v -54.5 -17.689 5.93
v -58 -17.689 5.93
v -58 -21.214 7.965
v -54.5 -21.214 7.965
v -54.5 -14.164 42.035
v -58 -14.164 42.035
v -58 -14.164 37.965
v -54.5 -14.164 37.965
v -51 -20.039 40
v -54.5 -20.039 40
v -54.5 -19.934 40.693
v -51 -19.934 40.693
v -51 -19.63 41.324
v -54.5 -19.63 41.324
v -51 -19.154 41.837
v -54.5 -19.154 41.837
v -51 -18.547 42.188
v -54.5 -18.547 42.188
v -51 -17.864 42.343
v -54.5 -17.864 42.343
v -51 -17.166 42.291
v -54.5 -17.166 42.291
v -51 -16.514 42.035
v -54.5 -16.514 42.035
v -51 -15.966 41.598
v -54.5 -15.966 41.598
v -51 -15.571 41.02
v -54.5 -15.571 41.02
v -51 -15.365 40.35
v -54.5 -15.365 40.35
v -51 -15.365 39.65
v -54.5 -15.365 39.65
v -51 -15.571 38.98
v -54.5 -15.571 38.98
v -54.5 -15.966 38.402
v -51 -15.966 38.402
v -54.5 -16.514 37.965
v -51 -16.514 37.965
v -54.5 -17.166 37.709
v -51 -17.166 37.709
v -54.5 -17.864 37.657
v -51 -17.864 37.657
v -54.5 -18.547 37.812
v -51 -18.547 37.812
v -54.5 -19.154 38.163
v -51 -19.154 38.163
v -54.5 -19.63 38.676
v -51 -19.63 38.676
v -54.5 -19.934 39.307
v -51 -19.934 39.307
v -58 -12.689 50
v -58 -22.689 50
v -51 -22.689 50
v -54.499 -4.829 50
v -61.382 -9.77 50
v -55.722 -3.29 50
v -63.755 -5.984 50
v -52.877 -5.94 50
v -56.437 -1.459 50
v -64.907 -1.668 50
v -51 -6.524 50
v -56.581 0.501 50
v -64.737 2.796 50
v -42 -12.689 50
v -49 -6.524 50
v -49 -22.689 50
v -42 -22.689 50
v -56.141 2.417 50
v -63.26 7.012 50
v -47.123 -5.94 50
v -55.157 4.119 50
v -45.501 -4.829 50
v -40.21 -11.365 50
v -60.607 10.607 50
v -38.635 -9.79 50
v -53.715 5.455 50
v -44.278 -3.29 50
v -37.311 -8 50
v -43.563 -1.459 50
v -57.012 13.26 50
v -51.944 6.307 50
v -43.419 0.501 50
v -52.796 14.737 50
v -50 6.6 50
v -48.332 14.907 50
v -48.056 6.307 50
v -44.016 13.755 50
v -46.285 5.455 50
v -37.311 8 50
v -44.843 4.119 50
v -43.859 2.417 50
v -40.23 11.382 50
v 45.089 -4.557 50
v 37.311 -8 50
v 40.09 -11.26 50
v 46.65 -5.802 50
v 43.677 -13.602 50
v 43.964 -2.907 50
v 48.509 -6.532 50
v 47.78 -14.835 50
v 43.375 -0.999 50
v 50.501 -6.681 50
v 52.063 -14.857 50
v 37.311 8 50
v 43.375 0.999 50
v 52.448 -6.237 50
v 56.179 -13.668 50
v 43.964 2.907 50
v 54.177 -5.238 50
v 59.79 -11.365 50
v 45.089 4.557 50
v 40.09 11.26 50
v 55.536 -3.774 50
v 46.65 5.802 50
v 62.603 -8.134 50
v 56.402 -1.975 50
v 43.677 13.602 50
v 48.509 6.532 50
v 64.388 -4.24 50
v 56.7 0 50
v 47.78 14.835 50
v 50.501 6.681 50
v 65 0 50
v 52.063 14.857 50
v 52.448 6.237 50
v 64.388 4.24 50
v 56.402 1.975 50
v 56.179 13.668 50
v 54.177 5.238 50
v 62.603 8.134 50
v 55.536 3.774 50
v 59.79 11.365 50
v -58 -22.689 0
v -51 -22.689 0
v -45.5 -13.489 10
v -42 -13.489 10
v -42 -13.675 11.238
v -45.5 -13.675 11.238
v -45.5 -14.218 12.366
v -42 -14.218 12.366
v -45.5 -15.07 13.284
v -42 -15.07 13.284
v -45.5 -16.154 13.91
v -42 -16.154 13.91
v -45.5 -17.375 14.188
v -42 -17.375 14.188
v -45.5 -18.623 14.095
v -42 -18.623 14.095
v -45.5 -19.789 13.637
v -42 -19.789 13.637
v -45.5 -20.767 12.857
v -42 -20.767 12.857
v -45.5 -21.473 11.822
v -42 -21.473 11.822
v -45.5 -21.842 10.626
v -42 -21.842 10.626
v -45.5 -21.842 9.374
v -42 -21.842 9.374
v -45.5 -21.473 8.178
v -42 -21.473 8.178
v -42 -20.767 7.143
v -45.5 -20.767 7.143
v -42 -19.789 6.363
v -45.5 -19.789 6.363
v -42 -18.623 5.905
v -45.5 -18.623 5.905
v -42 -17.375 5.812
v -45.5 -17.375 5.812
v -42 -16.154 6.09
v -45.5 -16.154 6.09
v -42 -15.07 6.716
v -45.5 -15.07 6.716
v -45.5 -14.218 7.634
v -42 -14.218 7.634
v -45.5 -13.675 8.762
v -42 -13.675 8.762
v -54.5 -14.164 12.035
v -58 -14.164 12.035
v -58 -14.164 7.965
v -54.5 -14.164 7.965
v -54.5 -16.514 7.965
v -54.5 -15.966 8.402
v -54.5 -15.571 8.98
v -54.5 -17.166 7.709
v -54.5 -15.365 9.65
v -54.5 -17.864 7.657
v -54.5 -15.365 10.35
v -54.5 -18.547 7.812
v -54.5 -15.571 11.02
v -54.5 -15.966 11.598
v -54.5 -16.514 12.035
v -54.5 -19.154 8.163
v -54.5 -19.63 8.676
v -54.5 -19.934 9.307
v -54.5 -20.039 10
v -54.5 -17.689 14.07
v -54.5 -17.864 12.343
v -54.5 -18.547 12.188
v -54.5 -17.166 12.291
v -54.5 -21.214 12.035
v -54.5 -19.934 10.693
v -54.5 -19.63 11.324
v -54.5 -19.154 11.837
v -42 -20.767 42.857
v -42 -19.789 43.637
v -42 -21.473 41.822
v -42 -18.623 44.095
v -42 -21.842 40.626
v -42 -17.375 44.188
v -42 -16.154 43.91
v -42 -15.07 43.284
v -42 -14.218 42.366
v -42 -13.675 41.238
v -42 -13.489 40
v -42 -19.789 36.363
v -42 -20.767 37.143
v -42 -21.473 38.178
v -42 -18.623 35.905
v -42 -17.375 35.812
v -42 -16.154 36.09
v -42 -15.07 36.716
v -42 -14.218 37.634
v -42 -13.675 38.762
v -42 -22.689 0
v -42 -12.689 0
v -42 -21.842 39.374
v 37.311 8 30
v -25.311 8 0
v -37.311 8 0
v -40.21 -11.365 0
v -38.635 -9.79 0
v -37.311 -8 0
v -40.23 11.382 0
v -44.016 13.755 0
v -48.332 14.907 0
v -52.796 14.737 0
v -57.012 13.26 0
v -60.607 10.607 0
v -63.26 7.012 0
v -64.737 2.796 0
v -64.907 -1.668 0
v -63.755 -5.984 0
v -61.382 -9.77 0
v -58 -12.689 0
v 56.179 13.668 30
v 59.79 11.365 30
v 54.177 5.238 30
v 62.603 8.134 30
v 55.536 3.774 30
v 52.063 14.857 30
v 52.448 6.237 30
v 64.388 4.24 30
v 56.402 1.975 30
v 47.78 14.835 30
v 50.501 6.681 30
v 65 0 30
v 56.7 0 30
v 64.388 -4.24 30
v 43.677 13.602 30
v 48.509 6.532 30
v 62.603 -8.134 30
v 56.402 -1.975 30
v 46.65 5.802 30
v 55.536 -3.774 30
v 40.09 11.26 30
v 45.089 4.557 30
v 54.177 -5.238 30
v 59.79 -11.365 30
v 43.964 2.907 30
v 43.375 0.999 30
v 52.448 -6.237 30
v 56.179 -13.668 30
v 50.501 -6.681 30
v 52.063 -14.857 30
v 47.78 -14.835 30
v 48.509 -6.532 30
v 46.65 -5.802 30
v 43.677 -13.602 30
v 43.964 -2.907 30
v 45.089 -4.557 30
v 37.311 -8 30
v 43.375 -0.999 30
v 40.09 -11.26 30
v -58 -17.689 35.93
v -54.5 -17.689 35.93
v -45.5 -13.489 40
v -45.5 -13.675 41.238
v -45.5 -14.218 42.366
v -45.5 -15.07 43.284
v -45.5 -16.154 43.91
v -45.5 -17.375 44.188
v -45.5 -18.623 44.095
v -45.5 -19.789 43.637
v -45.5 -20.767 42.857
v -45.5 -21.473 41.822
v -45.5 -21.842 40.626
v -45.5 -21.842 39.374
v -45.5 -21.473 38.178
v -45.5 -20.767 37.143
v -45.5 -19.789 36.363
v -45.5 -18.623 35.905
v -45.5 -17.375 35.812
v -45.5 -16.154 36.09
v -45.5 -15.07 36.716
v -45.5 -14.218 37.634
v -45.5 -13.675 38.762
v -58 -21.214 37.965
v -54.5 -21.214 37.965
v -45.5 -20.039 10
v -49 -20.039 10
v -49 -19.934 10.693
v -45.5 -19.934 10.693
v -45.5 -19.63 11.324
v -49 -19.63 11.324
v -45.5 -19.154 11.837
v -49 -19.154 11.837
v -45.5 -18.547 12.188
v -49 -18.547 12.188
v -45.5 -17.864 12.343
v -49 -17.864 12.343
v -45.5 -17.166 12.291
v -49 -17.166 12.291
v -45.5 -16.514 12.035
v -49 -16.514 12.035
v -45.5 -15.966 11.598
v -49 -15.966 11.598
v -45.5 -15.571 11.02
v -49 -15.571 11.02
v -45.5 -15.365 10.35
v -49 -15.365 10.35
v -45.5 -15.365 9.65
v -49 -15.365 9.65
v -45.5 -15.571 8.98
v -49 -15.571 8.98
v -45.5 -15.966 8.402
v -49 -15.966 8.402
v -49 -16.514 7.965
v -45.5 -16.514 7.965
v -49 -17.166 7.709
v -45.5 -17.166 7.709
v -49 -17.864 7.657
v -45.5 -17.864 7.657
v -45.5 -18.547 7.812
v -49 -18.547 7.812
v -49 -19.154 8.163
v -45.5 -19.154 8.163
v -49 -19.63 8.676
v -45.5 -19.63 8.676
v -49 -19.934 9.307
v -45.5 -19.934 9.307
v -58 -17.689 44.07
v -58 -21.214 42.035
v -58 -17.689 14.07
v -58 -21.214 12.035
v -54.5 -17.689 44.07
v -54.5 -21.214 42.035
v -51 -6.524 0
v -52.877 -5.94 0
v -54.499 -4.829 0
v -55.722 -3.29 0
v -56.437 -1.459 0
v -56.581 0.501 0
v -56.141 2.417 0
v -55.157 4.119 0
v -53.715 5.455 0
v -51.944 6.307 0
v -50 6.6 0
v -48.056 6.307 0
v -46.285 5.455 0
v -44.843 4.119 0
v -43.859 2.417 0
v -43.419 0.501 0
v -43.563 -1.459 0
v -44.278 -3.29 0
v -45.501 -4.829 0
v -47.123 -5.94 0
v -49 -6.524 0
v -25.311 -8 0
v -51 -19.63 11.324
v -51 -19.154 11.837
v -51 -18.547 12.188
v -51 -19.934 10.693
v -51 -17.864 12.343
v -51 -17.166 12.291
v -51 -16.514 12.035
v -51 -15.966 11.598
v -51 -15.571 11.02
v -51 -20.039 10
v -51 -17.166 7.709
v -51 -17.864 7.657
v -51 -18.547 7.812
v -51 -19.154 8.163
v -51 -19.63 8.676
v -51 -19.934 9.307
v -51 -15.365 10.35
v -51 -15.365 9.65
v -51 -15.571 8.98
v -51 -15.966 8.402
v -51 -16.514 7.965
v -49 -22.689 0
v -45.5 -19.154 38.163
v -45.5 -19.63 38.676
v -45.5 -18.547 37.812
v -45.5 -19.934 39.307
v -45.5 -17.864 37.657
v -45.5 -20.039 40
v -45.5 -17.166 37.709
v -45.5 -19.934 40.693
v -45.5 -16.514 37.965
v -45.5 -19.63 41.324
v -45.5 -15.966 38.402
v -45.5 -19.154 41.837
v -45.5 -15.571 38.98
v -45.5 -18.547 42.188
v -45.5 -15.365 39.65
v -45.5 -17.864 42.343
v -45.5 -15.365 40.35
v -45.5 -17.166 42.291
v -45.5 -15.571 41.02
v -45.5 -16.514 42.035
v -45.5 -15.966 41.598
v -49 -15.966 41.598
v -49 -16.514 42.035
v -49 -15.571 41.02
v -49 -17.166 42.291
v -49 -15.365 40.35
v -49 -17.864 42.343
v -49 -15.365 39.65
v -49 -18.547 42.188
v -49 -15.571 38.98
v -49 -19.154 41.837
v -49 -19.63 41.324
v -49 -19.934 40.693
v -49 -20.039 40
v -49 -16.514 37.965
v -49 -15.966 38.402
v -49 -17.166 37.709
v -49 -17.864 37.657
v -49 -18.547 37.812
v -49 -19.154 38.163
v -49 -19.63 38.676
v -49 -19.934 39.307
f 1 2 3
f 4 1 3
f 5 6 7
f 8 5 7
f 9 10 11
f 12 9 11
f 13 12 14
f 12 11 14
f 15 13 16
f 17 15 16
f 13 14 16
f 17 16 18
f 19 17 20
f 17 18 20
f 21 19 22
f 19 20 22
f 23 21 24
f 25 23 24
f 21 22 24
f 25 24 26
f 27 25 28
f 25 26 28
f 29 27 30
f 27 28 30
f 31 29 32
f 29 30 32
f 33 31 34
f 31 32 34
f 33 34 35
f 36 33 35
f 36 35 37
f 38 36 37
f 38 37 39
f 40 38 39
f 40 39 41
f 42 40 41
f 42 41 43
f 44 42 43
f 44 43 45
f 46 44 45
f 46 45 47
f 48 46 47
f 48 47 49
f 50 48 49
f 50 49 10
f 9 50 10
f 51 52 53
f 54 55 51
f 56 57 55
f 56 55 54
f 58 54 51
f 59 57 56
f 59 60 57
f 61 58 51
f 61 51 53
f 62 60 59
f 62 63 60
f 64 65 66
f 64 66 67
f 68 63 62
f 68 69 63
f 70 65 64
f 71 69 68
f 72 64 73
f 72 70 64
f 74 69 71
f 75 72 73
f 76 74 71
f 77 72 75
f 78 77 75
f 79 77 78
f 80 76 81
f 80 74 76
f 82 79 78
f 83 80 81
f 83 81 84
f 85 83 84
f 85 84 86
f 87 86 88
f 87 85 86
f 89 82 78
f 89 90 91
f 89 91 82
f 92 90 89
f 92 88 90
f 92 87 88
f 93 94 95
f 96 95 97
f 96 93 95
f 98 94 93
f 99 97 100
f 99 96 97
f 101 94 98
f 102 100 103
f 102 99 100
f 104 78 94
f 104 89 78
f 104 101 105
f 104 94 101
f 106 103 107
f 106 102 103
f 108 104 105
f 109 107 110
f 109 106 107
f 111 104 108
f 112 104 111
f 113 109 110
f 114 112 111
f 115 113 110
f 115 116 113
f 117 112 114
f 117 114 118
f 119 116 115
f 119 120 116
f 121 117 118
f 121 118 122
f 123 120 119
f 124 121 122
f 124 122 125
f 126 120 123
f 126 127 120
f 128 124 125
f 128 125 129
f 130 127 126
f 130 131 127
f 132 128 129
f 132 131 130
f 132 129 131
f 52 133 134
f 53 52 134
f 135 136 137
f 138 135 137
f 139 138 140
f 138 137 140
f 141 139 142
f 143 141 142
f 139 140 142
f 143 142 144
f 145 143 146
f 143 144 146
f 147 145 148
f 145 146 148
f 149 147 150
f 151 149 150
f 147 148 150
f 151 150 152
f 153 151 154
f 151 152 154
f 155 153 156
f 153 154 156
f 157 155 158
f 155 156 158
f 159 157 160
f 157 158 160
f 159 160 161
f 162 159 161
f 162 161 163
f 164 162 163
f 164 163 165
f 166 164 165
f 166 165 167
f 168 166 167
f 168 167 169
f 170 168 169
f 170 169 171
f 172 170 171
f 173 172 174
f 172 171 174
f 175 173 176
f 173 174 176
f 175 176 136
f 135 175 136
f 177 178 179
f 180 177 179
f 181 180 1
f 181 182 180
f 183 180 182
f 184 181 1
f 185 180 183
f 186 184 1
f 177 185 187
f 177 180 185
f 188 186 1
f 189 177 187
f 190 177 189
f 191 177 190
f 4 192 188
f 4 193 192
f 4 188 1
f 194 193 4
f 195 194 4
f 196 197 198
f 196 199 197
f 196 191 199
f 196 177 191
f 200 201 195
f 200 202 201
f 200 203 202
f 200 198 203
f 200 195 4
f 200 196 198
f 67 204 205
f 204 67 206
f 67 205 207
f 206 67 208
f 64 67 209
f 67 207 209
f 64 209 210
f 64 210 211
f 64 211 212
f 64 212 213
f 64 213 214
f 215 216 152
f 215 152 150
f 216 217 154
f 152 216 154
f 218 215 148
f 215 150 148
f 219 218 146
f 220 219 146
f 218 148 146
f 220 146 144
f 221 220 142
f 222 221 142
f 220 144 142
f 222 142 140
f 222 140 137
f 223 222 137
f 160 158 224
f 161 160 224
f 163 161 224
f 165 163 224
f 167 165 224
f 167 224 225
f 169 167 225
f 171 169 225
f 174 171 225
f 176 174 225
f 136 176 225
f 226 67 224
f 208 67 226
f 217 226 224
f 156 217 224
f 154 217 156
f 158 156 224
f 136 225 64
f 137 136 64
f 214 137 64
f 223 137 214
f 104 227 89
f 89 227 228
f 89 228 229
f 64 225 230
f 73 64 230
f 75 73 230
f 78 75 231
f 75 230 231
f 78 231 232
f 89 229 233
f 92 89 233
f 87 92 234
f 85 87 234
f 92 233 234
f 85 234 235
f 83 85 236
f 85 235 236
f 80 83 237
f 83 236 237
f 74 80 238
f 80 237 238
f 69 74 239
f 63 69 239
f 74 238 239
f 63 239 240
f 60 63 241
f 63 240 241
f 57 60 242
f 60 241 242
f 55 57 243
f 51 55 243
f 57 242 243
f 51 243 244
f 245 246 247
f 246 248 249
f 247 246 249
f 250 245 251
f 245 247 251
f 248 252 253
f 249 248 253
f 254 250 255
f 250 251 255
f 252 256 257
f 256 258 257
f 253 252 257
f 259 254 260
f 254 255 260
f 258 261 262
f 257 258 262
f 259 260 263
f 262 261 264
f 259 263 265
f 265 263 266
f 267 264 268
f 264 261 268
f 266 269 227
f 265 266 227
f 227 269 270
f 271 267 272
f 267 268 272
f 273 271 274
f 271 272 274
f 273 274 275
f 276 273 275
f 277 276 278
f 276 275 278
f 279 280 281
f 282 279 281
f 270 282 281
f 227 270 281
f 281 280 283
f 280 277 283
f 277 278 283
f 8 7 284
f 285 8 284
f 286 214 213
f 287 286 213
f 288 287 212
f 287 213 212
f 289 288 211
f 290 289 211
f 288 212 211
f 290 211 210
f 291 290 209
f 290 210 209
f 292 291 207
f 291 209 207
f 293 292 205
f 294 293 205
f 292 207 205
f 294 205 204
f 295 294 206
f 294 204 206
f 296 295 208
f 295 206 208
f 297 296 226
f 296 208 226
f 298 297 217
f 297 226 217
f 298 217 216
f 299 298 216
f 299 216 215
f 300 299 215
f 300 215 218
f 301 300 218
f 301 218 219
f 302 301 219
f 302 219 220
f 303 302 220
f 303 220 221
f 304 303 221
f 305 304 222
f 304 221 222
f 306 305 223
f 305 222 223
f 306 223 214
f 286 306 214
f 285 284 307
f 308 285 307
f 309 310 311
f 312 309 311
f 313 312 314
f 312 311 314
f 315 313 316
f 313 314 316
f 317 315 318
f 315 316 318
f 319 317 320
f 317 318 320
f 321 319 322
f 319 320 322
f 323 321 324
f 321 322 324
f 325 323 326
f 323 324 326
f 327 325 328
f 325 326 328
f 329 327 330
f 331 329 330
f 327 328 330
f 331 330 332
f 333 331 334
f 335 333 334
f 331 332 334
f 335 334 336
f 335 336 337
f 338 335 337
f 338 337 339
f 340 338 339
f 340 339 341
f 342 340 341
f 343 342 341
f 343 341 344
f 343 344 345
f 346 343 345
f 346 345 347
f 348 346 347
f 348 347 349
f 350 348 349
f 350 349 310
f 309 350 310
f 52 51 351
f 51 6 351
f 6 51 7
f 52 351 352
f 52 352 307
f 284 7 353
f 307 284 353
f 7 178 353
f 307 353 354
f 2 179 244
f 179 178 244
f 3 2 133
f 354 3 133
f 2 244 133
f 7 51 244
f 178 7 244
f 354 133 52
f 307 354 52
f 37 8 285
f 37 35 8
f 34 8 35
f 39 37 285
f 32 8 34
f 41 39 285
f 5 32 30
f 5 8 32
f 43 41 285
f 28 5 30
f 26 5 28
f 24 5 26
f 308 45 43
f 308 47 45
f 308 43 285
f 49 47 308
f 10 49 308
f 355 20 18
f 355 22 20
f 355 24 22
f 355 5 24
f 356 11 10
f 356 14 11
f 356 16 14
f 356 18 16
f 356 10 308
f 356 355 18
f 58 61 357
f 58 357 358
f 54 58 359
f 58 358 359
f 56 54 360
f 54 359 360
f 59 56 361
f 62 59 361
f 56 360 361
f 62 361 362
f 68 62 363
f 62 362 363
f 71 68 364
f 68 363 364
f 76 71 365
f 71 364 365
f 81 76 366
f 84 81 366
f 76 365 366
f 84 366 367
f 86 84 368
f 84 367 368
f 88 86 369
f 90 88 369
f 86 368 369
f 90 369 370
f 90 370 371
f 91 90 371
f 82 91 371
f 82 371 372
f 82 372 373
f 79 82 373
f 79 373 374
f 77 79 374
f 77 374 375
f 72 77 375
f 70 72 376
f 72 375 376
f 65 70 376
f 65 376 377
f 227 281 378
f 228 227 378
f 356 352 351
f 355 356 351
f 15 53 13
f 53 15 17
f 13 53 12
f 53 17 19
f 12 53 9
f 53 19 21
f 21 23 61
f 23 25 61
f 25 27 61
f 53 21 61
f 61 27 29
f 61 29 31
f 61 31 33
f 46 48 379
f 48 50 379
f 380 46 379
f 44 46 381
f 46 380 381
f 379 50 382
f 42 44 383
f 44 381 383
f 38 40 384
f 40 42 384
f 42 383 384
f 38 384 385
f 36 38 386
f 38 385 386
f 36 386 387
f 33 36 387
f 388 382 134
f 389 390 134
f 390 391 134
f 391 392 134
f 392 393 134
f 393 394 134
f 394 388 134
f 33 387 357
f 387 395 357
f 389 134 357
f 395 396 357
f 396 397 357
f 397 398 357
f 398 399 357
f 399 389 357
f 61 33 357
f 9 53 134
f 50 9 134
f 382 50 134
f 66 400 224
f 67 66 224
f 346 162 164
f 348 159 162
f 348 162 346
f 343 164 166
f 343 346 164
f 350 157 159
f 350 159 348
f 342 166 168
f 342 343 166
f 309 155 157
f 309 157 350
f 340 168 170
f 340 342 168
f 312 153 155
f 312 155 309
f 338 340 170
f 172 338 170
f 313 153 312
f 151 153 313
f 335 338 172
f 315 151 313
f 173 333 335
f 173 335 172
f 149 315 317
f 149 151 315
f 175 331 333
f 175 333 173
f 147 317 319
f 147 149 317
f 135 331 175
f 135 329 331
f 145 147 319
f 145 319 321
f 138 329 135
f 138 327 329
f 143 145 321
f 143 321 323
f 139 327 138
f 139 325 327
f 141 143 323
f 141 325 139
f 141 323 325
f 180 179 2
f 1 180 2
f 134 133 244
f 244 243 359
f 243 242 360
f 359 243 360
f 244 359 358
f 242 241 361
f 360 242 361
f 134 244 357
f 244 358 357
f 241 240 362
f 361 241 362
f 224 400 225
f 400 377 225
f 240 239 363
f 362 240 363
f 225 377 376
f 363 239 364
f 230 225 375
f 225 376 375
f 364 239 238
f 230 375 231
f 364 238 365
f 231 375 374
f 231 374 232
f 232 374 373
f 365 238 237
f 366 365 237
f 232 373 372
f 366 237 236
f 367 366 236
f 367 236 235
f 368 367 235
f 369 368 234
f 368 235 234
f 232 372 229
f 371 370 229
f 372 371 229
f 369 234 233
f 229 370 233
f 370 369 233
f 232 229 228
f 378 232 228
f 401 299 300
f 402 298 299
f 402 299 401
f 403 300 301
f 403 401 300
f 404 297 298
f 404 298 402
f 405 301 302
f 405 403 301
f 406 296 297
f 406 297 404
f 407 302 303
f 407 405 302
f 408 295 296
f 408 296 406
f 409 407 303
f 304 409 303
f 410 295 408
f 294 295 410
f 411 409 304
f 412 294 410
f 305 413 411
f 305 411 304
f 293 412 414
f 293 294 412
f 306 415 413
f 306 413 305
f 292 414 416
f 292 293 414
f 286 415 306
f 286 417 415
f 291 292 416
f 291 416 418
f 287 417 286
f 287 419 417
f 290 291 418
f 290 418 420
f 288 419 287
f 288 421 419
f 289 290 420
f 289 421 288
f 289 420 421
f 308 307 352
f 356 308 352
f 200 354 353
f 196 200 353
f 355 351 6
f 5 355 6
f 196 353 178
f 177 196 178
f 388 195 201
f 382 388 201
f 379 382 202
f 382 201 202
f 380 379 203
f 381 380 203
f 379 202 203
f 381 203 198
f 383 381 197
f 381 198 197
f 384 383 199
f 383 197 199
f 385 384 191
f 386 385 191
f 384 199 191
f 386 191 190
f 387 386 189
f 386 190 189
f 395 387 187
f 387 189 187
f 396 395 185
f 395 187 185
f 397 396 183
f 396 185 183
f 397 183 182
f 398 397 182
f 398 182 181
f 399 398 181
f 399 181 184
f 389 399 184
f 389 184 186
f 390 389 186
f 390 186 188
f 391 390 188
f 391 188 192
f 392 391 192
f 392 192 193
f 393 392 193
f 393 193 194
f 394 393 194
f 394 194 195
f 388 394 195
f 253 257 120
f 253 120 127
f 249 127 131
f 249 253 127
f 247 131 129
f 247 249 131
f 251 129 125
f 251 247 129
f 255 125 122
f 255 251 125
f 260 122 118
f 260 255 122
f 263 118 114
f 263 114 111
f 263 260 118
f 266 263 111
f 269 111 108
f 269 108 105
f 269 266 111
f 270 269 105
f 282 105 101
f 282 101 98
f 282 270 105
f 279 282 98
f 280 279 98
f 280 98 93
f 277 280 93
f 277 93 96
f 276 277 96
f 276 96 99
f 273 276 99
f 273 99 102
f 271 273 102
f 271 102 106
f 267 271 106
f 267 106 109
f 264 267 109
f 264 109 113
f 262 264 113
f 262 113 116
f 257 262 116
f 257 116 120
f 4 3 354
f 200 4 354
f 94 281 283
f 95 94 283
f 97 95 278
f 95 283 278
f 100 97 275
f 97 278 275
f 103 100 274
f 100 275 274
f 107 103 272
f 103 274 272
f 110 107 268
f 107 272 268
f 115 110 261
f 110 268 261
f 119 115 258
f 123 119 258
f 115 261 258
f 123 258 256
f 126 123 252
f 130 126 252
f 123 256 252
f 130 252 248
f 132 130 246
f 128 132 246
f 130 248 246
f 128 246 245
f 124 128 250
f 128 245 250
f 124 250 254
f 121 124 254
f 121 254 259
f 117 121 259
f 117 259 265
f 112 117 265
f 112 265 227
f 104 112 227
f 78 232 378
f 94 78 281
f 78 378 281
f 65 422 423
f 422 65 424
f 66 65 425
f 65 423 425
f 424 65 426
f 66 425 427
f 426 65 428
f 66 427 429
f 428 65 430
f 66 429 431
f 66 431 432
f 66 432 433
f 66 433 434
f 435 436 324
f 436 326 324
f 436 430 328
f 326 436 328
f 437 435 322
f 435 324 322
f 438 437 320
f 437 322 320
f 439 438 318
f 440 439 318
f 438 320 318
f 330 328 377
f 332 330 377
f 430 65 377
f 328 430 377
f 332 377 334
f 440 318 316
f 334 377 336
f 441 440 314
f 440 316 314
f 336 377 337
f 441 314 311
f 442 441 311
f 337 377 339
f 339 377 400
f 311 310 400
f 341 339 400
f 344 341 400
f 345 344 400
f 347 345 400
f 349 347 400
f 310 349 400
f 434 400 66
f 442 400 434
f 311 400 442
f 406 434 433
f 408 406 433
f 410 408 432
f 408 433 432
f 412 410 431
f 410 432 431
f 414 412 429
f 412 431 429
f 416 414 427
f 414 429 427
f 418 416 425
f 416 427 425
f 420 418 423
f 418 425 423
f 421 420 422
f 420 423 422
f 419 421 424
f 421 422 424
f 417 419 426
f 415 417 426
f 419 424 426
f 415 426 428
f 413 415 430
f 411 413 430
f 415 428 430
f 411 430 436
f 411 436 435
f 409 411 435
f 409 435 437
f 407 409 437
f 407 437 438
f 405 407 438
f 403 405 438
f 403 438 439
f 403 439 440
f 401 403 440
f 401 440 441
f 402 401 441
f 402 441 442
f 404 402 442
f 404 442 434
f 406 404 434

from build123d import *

# Parameters (mm, degrees)
F0_R      = 6.7
F1_DEPTH  = 50
F4_DEPTH  = 38.001
F5_R      = 2.35
F6_DEPTH  = 20
F8_DEPTH  = 3.5
F9_R      = 4.2
F10_DEPTH = 3.5


with BuildPart() as f1:
    # F0 (on Top) → F1 (new body)
    with BuildSketch(Plane.XY):
        with BuildLine():
            Line((-42, -22.6885775404), (-42, -12.6885775404))
            ThreePointArc((-42, -12.6885775404), (-39.3933982822, -10.6066017178), (-37.3114224596, -8))
            Line((-37.3114224596, -8), (37.3114224596, -8))
            ThreePointArc((37.3114224596, -8), (65, 0), (37.3114224596, 8))
            Line((37.3114224596, 8), (-37.3114224596, 8))
            ThreePointArc((-37.3114224596, 8), (-60.6066017178, 10.6066017178), (-58, -12.6885775404))
            Line((-58, -12.6885775404), (-58, -22.6885775404))
            Line((-58, -22.6885775404), (-51, -22.6885775404))
            Line((-51, -22.6885775404), (-51, -6.5238025721))
            ThreePointArc((-51, -6.5238025721), (-50, 6.6), (-49, -6.5238025721))
            Line((-49, -6.5238025721), (-49, -22.6885775404))
            Line((-49, -22.6885775404), (-42, -22.6885775404))
        make_face()
        with Locations((50, 0)):
            Circle(F0_R, mode=Mode.SUBTRACT)
    extrude(amount=F1_DEPTH)

    # F3 (on offset) → F4 (cut, through all)
    with BuildSketch(Plane.XZ.offset(23)):
        Polygon((37.3114224596, 30), (-25.3114224596, 0), (77.7690705738, 0), (77.7690705738, 30), align=None)
    extrude(amount=-F4_DEPTH, mode=Mode.SUBTRACT)

    # F5 (on face) → F6 (cut)
    with BuildSketch(Plane(origin=(-58, 0, 0), x_dir=(0, -1, 0), z_dir=(-1, 0, 0))):
        with Locations((17.6885775404, 40)):
            Circle(F5_R)
        with Locations((17.6885775404, 10)):
            Circle(F5_R)
    extrude(amount=-F6_DEPTH, mode=Mode.SUBTRACT)

    # F7 (on face) → F8 (cut)
    with BuildSketch(Plane(origin=(-58, 0, 0), x_dir=(0, -1, 0), z_dir=(-1, 0, 0))):
        Polygon((17.6885775404, 35.9296806022), (21.2135775404, 37.9648403011), (21.2135775404, 42.0351596989), (17.6885775404, 44.0703193978), (14.1635775404, 42.0351596989), (14.1635775404, 37.9648403011), align=None)
        Polygon((17.6885775404, 5.9296806022), (21.2135775404, 7.9648403011), (21.2135775404, 12.0351596989), (17.6885775404, 14.0703193978), (14.1635775404, 12.0351596989), (14.1635775404, 7.9648403011), align=None)
    extrude(amount=-F8_DEPTH, mode=Mode.SUBTRACT)

    # F9 (on face) → F10 (cut)
    with BuildSketch(Plane.YZ.offset(-42)):
        with Locations((-17.6885775404, 40)):
            Circle(F9_R)
        with Locations((-17.6885775404, 10)):
            Circle(F9_R)
    extrude(amount=-F10_DEPTH, mode=Mode.SUBTRACT)


solid = f1.part
